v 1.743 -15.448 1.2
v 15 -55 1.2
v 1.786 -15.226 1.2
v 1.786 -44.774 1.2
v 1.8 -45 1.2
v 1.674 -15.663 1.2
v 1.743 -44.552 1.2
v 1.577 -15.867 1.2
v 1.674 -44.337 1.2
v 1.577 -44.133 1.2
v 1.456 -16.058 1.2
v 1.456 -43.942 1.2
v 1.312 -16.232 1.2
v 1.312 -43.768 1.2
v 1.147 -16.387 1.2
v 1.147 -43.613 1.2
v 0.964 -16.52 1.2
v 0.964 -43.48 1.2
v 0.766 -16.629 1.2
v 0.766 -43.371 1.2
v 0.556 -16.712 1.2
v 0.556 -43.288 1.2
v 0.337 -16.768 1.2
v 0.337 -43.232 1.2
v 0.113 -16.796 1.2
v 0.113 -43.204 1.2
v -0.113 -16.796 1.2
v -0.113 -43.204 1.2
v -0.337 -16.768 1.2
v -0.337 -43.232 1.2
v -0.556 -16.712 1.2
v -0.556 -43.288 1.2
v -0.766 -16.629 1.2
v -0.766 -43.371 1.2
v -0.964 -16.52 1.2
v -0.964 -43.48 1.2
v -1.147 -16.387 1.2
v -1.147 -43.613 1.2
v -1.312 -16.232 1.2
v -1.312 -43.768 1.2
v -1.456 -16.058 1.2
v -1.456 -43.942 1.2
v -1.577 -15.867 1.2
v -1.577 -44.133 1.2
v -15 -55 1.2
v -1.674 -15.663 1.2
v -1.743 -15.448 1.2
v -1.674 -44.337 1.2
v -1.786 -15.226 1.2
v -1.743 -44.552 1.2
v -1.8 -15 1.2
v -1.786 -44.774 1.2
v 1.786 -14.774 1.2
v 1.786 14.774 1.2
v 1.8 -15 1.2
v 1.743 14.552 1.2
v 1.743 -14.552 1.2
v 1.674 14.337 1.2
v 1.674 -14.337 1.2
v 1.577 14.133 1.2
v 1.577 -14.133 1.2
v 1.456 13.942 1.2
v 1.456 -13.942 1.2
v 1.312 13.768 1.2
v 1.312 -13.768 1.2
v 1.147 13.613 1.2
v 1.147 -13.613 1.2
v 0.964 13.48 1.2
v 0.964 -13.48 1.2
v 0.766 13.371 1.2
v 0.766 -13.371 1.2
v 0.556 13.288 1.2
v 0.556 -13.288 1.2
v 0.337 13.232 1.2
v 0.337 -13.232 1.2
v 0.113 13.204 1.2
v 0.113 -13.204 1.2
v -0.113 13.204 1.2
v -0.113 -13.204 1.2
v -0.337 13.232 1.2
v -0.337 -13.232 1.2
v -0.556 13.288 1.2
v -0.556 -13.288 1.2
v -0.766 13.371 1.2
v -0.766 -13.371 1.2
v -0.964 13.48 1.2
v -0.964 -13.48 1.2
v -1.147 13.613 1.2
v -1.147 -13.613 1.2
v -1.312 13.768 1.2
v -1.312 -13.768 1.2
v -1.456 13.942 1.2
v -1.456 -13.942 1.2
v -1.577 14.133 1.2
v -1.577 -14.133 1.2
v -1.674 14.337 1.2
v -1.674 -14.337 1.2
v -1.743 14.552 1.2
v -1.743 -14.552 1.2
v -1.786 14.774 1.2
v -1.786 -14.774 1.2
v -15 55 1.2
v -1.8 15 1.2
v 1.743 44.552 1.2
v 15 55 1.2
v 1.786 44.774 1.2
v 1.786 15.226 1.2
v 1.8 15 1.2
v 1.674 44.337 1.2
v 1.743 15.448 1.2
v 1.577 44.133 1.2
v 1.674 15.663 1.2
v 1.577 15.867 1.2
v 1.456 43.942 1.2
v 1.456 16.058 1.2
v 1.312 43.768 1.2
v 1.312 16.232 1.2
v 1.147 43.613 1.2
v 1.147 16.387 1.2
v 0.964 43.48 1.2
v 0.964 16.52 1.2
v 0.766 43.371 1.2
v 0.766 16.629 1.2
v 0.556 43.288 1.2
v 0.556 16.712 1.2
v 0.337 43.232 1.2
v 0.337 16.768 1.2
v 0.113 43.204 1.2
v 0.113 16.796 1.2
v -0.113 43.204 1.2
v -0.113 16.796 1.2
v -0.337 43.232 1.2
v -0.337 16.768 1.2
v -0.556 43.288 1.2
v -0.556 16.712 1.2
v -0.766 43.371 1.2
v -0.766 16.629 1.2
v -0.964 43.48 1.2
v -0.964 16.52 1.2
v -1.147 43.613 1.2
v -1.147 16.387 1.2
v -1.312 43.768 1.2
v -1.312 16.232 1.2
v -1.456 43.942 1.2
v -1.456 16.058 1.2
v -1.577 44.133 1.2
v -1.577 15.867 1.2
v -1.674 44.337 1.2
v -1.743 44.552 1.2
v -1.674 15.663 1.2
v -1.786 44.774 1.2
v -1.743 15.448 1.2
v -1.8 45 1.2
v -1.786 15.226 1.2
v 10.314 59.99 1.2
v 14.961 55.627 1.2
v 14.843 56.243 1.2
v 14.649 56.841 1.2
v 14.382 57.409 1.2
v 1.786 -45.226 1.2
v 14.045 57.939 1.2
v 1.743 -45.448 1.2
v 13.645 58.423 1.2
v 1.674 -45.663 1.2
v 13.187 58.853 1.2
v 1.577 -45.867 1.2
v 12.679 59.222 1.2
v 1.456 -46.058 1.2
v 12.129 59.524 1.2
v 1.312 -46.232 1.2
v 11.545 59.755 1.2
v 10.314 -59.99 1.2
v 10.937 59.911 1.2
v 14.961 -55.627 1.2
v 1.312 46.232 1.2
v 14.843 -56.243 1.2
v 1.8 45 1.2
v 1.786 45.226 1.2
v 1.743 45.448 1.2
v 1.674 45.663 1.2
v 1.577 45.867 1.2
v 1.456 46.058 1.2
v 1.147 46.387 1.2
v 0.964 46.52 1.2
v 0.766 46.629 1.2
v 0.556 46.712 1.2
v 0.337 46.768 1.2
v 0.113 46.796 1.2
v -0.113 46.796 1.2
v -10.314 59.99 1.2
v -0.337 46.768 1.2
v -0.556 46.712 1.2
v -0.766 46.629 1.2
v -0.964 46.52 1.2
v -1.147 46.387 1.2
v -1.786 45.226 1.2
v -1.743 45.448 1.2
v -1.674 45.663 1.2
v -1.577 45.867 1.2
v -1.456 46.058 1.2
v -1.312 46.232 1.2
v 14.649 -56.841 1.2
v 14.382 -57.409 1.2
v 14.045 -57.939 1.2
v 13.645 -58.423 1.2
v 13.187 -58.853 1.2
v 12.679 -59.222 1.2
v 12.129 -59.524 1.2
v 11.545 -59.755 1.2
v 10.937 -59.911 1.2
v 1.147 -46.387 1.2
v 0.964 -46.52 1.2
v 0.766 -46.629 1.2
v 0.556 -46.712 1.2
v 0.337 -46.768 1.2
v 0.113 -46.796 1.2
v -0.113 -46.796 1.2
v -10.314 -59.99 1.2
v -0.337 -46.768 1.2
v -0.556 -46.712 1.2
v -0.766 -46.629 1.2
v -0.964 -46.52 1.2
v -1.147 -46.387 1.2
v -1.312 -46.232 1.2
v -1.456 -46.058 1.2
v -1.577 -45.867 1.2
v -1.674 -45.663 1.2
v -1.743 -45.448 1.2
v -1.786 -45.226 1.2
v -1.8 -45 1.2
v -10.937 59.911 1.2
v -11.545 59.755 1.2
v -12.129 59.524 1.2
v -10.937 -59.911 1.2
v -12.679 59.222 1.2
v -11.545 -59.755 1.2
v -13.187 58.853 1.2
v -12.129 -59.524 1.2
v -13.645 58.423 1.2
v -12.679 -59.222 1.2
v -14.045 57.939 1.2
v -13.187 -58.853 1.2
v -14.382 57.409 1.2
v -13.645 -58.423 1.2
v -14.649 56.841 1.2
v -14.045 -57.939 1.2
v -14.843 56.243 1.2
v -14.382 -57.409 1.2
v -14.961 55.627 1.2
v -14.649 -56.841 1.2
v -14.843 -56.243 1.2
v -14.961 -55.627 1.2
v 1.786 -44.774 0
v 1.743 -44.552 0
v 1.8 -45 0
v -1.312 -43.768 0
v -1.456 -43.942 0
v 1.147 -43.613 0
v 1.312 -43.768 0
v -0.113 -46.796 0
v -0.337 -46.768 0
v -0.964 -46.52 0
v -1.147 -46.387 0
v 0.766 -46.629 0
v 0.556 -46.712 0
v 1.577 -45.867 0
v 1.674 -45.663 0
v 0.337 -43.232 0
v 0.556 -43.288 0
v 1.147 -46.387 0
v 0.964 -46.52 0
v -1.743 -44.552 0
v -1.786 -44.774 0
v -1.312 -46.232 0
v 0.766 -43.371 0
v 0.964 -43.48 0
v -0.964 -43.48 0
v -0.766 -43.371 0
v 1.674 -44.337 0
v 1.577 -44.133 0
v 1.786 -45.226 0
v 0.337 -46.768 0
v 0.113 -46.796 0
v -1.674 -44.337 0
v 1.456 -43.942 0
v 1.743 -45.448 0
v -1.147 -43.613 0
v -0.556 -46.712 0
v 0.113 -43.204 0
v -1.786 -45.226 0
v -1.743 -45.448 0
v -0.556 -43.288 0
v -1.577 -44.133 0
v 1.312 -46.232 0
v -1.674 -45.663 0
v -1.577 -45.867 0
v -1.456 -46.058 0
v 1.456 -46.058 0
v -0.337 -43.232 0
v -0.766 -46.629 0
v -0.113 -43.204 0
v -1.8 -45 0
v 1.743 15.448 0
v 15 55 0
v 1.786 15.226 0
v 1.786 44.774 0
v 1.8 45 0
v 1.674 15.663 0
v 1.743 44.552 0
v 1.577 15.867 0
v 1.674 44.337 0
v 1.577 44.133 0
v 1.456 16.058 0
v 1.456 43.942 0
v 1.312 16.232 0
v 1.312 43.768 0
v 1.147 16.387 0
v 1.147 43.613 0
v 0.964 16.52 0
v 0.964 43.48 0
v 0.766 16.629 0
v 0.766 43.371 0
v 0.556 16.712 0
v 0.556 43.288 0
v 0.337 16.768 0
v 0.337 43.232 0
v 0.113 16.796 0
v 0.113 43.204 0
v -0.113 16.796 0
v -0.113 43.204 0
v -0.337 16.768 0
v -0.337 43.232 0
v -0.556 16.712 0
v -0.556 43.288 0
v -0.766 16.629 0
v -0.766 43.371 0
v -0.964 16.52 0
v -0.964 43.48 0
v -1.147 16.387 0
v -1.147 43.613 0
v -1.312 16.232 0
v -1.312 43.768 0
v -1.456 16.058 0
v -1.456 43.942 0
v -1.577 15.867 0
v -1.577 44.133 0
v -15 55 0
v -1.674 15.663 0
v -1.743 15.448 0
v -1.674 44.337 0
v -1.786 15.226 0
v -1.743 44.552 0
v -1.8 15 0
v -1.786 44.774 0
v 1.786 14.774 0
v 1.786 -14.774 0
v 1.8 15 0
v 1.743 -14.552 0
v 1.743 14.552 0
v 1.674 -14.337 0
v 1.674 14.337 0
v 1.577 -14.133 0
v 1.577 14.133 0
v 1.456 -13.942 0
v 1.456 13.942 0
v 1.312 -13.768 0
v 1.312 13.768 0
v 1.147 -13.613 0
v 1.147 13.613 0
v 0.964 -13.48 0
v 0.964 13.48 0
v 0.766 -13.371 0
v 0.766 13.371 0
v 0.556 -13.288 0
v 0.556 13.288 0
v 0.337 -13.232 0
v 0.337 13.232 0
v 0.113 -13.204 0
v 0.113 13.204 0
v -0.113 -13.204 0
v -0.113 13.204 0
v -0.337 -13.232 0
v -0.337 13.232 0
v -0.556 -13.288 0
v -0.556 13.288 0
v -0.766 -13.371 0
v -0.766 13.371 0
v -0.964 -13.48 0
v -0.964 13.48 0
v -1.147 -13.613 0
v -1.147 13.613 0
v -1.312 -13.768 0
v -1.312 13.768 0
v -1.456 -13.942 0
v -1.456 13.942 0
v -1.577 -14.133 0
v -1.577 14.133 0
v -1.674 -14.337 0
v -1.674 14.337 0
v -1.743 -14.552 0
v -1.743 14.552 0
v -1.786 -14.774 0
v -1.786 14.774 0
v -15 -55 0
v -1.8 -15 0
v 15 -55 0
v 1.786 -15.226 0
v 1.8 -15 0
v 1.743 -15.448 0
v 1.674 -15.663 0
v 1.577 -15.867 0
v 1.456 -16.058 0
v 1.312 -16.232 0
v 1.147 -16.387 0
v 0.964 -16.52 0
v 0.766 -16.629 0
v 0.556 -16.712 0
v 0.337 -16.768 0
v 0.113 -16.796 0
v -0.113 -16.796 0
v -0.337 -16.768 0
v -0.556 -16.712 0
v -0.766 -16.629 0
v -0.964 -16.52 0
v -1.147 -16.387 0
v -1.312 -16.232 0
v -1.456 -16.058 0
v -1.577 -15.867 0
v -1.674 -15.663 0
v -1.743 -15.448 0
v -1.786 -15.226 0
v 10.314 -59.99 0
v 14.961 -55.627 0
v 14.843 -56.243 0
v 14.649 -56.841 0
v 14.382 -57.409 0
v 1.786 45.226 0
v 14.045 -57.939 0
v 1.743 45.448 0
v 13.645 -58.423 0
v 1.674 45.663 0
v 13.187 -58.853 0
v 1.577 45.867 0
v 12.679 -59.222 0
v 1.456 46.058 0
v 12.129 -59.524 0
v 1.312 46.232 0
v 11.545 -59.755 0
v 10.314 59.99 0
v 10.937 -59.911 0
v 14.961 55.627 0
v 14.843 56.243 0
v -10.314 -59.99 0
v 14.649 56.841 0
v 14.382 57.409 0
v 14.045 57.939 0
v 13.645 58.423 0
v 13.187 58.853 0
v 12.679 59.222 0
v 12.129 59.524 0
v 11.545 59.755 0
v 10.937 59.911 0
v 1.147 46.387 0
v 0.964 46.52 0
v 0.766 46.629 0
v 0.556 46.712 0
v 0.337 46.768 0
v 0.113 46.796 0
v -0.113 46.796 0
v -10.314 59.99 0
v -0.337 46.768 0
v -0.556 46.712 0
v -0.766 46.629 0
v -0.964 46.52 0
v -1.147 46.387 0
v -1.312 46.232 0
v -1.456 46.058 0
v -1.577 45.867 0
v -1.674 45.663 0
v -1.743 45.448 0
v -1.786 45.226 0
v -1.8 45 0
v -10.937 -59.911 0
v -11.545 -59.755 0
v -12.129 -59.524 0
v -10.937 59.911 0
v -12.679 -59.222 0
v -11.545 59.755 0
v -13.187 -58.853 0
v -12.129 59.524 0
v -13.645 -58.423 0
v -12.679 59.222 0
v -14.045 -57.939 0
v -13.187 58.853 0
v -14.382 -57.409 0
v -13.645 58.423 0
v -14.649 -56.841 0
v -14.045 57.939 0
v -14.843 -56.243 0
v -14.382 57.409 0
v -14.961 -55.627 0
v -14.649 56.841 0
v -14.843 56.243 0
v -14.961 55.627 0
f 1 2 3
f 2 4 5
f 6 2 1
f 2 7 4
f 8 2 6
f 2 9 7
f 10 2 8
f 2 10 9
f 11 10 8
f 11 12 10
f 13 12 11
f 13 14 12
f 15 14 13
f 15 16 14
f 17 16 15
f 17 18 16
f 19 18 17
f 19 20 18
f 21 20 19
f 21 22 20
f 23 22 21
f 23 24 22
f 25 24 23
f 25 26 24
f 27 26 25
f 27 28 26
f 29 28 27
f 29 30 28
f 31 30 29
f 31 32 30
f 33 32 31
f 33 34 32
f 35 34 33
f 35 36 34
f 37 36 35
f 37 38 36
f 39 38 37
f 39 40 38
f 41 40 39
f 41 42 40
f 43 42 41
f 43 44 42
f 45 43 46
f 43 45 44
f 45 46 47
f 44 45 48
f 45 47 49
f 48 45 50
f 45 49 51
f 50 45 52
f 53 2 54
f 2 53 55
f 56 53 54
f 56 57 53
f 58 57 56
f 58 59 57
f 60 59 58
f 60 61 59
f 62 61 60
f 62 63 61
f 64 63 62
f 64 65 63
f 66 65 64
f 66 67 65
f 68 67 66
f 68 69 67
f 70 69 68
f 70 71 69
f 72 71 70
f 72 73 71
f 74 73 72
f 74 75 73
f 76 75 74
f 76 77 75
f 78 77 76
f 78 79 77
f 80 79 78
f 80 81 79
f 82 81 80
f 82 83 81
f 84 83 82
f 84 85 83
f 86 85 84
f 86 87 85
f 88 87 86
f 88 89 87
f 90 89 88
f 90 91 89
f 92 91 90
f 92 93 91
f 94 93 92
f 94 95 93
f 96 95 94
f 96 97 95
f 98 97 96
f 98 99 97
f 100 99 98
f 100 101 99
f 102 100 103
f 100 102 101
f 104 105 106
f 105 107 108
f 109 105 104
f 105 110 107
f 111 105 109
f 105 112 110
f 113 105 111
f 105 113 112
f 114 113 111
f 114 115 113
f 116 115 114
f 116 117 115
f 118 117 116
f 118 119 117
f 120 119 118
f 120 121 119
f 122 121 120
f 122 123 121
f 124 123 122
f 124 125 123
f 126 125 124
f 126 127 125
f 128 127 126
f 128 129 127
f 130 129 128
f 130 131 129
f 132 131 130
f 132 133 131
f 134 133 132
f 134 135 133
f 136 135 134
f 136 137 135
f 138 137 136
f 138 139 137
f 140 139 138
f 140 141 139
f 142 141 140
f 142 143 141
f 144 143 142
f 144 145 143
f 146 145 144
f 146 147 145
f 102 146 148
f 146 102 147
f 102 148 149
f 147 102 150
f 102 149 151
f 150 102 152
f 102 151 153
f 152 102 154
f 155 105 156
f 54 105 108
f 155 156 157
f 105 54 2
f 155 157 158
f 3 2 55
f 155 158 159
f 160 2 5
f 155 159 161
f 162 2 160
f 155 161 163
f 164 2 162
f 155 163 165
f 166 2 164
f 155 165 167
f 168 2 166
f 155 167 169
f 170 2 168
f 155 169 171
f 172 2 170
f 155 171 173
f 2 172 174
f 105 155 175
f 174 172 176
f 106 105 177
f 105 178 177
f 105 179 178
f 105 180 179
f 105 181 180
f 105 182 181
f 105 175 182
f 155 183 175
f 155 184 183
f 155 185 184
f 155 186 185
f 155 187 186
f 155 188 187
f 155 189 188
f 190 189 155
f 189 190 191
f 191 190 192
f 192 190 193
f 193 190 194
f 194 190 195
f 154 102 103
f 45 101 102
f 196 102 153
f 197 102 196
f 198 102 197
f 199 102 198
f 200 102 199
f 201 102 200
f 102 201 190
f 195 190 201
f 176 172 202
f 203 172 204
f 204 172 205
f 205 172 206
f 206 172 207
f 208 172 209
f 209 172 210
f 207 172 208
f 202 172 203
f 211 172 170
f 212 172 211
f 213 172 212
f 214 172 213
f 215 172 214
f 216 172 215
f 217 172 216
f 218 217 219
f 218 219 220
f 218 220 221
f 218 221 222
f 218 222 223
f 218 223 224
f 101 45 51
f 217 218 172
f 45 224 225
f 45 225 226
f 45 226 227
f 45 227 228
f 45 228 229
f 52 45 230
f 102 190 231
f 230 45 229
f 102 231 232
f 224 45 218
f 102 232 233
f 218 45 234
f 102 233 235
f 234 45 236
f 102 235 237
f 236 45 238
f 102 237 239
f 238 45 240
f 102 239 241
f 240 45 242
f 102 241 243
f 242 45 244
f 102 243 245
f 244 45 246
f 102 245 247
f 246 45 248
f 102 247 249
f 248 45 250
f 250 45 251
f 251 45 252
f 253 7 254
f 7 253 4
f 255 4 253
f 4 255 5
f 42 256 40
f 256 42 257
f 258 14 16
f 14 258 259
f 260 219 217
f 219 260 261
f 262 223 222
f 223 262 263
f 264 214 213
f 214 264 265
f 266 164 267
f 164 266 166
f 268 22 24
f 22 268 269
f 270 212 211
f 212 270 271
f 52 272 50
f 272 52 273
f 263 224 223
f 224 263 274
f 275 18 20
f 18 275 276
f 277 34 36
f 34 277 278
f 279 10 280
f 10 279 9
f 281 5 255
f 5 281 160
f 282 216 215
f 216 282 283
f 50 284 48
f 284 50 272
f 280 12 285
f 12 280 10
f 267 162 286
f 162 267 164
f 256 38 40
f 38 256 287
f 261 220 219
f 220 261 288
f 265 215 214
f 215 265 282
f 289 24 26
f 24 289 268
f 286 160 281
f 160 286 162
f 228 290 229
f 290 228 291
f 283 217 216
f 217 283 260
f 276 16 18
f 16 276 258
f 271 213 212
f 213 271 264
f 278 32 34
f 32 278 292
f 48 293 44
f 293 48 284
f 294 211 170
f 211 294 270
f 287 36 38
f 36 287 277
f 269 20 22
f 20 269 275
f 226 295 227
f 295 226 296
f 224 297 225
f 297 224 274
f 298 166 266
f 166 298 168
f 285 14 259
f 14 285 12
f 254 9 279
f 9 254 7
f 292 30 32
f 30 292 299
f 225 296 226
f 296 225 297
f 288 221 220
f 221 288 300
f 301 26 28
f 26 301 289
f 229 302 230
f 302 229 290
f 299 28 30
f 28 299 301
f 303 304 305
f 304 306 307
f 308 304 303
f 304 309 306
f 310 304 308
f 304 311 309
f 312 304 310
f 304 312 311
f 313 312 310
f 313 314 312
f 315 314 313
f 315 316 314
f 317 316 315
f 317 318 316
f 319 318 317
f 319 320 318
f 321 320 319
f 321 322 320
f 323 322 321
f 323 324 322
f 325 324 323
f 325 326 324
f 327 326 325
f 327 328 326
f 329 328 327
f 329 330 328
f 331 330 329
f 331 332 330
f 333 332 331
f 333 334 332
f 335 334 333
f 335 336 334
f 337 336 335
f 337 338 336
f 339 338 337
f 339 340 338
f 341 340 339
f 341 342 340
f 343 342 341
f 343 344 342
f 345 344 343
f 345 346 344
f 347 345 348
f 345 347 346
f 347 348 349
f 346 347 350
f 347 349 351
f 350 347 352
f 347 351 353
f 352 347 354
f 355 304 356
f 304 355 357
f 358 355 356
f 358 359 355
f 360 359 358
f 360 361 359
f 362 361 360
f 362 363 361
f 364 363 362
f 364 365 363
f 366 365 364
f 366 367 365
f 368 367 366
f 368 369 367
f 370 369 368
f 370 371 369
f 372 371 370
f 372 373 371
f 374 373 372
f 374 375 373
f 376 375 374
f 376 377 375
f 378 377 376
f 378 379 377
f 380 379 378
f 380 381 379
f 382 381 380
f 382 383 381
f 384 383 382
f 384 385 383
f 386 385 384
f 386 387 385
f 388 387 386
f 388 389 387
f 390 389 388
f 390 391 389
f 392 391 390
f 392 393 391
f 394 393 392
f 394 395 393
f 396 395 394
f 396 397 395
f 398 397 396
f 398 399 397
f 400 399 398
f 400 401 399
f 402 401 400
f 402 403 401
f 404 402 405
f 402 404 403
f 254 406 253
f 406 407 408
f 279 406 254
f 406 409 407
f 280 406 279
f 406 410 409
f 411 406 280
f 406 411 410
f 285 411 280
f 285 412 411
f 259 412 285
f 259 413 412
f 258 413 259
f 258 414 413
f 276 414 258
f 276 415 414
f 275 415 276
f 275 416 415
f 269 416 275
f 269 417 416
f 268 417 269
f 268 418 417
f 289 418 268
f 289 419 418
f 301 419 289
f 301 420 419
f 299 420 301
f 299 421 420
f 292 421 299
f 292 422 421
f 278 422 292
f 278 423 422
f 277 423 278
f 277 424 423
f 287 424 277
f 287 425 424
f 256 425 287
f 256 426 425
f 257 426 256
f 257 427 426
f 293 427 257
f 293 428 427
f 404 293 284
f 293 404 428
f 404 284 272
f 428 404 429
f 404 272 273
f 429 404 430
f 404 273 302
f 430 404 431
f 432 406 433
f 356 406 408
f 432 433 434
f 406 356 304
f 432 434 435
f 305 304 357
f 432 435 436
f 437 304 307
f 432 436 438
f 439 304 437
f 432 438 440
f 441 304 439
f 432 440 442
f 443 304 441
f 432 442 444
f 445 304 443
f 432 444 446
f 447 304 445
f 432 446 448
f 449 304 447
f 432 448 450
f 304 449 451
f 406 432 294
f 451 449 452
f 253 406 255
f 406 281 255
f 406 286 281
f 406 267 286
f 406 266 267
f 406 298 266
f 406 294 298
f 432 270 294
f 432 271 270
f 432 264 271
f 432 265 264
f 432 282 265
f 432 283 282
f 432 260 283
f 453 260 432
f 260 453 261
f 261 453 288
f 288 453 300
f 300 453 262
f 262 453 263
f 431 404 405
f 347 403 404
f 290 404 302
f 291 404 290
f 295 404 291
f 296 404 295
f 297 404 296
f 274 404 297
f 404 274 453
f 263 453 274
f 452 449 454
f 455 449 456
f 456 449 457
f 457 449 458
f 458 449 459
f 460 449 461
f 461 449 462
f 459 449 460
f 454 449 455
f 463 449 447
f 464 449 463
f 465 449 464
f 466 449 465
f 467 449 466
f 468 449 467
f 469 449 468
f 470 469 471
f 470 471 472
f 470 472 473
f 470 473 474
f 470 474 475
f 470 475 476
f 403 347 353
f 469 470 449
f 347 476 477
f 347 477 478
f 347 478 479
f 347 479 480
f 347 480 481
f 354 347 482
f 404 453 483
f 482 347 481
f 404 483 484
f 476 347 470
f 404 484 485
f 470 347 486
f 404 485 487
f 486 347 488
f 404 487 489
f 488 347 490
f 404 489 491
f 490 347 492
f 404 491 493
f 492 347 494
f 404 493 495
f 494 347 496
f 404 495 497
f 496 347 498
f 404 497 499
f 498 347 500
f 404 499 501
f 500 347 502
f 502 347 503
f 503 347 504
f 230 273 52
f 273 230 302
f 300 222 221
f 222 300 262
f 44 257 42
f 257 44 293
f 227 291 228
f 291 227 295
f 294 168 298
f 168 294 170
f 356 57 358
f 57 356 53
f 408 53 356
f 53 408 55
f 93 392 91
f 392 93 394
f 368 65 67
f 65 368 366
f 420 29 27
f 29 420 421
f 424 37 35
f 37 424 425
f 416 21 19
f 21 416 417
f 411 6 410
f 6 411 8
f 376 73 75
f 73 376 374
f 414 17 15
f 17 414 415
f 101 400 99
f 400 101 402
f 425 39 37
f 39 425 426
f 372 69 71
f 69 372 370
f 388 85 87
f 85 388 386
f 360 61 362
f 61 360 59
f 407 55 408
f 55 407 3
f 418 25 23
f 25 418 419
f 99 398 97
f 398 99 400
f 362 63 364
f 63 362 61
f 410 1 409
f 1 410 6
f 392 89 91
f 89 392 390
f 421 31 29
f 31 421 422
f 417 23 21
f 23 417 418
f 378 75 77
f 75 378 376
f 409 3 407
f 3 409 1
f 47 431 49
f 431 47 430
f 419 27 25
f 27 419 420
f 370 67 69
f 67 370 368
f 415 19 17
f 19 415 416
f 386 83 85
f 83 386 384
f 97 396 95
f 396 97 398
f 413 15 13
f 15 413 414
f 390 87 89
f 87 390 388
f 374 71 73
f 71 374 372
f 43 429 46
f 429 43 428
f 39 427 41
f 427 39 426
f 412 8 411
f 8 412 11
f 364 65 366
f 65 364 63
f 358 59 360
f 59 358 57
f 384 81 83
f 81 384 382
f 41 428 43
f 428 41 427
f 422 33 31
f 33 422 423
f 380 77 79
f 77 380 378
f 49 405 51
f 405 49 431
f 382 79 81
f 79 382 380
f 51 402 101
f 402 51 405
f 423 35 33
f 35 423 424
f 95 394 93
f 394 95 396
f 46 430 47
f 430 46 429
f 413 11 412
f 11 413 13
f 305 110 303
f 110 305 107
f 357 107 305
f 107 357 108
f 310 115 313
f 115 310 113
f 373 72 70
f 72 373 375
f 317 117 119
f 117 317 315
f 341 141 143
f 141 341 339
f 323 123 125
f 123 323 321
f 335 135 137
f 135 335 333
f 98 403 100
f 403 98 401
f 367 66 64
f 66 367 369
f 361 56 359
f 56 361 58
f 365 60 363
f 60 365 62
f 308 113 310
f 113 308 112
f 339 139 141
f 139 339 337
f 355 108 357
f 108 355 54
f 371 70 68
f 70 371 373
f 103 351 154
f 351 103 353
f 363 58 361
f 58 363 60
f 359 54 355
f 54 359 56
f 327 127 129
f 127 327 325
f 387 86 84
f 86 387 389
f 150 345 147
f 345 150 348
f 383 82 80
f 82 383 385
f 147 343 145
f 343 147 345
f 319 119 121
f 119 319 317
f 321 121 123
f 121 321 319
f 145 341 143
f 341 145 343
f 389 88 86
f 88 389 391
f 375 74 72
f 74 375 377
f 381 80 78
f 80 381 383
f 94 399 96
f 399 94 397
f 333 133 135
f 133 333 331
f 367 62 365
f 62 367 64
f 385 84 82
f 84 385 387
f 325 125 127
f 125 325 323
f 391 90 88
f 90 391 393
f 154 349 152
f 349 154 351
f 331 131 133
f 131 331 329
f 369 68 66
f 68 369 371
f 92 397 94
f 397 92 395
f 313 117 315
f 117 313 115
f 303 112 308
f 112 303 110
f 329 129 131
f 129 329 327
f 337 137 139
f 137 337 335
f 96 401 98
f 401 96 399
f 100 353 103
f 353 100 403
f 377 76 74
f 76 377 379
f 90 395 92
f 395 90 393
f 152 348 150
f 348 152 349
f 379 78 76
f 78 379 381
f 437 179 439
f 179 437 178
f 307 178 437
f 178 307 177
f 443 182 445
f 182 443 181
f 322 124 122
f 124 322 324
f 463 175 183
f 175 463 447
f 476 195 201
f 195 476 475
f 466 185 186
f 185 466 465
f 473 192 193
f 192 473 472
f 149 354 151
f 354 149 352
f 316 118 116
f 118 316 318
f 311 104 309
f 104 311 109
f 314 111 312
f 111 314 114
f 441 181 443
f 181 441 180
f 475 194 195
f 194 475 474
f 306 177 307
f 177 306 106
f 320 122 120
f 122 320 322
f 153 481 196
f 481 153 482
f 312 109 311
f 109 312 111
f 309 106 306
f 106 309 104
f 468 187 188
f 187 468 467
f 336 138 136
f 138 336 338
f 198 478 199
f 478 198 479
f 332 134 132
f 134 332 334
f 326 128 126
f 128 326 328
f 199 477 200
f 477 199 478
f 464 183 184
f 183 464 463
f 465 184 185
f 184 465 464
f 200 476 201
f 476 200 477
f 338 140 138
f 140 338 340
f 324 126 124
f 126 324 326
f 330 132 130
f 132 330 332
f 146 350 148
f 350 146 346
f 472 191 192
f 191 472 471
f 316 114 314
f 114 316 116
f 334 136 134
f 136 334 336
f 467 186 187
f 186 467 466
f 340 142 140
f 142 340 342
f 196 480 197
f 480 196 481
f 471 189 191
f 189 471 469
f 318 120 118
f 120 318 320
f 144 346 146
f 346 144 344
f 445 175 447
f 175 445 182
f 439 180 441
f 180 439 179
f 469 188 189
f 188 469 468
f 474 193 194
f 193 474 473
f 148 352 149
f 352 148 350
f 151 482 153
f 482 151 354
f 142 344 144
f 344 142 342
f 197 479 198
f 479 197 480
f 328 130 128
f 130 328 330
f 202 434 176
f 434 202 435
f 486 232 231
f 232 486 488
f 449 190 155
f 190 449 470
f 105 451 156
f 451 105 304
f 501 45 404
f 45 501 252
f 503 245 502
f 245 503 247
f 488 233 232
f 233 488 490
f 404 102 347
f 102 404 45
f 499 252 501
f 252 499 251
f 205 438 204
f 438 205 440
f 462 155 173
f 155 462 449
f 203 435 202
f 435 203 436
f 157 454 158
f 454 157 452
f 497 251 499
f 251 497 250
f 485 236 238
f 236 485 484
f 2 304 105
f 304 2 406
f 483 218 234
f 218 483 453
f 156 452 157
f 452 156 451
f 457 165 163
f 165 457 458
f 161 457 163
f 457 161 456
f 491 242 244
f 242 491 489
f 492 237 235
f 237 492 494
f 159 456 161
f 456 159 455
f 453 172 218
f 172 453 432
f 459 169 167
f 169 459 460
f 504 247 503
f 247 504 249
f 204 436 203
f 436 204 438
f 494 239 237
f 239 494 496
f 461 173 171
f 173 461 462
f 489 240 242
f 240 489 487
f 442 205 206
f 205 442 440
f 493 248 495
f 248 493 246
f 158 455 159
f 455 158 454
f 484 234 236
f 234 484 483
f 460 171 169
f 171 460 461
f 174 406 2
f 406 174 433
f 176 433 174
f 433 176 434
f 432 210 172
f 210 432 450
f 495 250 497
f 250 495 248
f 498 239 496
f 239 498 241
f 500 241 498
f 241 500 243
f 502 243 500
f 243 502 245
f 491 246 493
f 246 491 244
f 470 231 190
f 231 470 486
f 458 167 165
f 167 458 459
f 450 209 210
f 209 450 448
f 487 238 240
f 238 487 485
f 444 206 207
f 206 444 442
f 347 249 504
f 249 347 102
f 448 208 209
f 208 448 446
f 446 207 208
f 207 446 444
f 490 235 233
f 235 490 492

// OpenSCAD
$fn = 50;


difference() {
	union() {
		hull() {
			translate(v = [-10.0000000000, 55.0000000000, 0]) {
				cylinder(h = 60, r = 5);
			}
			translate(v = [10.0000000000, 55.0000000000, 0]) {
				cylinder(h = 60, r = 5);
			}
			translate(v = [-10.0000000000, -55.0000000000, 0]) {
				cylinder(h = 60, r = 5);
			}
			translate(v = [10.0000000000, -55.0000000000, 0]) {
				cylinder(h = 60, r = 5);
			}
		}
	}
	union() {
		translate(v = [0, 0, 1.2000000000]) {
			hull() {
				translate(v = [-10.0000000000, 55.0000000000, 0]) {
					cylinder(h = 58.8000000000, r = 3.8000000000);
				}
				translate(v = [10.0000000000, 55.0000000000, 0]) {
					cylinder(h = 58.8000000000, r = 3.8000000000);
				}
				translate(v = [-10.0000000000, -55.0000000000, 0]) {
					cylinder(h = 58.8000000000, r = 3.8000000000);
				}
				translate(v = [10.0000000000, -55.0000000000, 0]) {
					cylinder(h = 58.8000000000, r = 3.8000000000);
				}
			}
		}
		#translate(v = [0.0000000000, -45.0000000000, 0]) {
			cylinder(h = 1.2000000000, r = 1.8000000000);
		}
		#translate(v = [0.0000000000, -15.0000000000, 0]) {
			cylinder(h = 1.2000000000, r = 1.8000000000);
		}
		#translate(v = [0.0000000000, 15.0000000000, 0]) {
			cylinder(h = 1.2000000000, r = 1.8000000000);
		}
		#translate(v = [0.0000000000, 45.0000000000, 0]) {
			cylinder(h = 1.2000000000, r = 1.8000000000);
		}
		translate(v = [-250.0000000000, -250.0000000000, 1.2000000000]) {
			cube(size = [500, 500, 500]);
		}
		translate(v = [-250.0000000000, -250.0000000000, 1.2000000000]) {
			cube(size = [500, 500, 500]);
		}
		translate(v = [-250.0000000000, -250.0000000000, 1.2000000000]) {
			cube(size = [500, 500, 500]);
		}
	}
}
